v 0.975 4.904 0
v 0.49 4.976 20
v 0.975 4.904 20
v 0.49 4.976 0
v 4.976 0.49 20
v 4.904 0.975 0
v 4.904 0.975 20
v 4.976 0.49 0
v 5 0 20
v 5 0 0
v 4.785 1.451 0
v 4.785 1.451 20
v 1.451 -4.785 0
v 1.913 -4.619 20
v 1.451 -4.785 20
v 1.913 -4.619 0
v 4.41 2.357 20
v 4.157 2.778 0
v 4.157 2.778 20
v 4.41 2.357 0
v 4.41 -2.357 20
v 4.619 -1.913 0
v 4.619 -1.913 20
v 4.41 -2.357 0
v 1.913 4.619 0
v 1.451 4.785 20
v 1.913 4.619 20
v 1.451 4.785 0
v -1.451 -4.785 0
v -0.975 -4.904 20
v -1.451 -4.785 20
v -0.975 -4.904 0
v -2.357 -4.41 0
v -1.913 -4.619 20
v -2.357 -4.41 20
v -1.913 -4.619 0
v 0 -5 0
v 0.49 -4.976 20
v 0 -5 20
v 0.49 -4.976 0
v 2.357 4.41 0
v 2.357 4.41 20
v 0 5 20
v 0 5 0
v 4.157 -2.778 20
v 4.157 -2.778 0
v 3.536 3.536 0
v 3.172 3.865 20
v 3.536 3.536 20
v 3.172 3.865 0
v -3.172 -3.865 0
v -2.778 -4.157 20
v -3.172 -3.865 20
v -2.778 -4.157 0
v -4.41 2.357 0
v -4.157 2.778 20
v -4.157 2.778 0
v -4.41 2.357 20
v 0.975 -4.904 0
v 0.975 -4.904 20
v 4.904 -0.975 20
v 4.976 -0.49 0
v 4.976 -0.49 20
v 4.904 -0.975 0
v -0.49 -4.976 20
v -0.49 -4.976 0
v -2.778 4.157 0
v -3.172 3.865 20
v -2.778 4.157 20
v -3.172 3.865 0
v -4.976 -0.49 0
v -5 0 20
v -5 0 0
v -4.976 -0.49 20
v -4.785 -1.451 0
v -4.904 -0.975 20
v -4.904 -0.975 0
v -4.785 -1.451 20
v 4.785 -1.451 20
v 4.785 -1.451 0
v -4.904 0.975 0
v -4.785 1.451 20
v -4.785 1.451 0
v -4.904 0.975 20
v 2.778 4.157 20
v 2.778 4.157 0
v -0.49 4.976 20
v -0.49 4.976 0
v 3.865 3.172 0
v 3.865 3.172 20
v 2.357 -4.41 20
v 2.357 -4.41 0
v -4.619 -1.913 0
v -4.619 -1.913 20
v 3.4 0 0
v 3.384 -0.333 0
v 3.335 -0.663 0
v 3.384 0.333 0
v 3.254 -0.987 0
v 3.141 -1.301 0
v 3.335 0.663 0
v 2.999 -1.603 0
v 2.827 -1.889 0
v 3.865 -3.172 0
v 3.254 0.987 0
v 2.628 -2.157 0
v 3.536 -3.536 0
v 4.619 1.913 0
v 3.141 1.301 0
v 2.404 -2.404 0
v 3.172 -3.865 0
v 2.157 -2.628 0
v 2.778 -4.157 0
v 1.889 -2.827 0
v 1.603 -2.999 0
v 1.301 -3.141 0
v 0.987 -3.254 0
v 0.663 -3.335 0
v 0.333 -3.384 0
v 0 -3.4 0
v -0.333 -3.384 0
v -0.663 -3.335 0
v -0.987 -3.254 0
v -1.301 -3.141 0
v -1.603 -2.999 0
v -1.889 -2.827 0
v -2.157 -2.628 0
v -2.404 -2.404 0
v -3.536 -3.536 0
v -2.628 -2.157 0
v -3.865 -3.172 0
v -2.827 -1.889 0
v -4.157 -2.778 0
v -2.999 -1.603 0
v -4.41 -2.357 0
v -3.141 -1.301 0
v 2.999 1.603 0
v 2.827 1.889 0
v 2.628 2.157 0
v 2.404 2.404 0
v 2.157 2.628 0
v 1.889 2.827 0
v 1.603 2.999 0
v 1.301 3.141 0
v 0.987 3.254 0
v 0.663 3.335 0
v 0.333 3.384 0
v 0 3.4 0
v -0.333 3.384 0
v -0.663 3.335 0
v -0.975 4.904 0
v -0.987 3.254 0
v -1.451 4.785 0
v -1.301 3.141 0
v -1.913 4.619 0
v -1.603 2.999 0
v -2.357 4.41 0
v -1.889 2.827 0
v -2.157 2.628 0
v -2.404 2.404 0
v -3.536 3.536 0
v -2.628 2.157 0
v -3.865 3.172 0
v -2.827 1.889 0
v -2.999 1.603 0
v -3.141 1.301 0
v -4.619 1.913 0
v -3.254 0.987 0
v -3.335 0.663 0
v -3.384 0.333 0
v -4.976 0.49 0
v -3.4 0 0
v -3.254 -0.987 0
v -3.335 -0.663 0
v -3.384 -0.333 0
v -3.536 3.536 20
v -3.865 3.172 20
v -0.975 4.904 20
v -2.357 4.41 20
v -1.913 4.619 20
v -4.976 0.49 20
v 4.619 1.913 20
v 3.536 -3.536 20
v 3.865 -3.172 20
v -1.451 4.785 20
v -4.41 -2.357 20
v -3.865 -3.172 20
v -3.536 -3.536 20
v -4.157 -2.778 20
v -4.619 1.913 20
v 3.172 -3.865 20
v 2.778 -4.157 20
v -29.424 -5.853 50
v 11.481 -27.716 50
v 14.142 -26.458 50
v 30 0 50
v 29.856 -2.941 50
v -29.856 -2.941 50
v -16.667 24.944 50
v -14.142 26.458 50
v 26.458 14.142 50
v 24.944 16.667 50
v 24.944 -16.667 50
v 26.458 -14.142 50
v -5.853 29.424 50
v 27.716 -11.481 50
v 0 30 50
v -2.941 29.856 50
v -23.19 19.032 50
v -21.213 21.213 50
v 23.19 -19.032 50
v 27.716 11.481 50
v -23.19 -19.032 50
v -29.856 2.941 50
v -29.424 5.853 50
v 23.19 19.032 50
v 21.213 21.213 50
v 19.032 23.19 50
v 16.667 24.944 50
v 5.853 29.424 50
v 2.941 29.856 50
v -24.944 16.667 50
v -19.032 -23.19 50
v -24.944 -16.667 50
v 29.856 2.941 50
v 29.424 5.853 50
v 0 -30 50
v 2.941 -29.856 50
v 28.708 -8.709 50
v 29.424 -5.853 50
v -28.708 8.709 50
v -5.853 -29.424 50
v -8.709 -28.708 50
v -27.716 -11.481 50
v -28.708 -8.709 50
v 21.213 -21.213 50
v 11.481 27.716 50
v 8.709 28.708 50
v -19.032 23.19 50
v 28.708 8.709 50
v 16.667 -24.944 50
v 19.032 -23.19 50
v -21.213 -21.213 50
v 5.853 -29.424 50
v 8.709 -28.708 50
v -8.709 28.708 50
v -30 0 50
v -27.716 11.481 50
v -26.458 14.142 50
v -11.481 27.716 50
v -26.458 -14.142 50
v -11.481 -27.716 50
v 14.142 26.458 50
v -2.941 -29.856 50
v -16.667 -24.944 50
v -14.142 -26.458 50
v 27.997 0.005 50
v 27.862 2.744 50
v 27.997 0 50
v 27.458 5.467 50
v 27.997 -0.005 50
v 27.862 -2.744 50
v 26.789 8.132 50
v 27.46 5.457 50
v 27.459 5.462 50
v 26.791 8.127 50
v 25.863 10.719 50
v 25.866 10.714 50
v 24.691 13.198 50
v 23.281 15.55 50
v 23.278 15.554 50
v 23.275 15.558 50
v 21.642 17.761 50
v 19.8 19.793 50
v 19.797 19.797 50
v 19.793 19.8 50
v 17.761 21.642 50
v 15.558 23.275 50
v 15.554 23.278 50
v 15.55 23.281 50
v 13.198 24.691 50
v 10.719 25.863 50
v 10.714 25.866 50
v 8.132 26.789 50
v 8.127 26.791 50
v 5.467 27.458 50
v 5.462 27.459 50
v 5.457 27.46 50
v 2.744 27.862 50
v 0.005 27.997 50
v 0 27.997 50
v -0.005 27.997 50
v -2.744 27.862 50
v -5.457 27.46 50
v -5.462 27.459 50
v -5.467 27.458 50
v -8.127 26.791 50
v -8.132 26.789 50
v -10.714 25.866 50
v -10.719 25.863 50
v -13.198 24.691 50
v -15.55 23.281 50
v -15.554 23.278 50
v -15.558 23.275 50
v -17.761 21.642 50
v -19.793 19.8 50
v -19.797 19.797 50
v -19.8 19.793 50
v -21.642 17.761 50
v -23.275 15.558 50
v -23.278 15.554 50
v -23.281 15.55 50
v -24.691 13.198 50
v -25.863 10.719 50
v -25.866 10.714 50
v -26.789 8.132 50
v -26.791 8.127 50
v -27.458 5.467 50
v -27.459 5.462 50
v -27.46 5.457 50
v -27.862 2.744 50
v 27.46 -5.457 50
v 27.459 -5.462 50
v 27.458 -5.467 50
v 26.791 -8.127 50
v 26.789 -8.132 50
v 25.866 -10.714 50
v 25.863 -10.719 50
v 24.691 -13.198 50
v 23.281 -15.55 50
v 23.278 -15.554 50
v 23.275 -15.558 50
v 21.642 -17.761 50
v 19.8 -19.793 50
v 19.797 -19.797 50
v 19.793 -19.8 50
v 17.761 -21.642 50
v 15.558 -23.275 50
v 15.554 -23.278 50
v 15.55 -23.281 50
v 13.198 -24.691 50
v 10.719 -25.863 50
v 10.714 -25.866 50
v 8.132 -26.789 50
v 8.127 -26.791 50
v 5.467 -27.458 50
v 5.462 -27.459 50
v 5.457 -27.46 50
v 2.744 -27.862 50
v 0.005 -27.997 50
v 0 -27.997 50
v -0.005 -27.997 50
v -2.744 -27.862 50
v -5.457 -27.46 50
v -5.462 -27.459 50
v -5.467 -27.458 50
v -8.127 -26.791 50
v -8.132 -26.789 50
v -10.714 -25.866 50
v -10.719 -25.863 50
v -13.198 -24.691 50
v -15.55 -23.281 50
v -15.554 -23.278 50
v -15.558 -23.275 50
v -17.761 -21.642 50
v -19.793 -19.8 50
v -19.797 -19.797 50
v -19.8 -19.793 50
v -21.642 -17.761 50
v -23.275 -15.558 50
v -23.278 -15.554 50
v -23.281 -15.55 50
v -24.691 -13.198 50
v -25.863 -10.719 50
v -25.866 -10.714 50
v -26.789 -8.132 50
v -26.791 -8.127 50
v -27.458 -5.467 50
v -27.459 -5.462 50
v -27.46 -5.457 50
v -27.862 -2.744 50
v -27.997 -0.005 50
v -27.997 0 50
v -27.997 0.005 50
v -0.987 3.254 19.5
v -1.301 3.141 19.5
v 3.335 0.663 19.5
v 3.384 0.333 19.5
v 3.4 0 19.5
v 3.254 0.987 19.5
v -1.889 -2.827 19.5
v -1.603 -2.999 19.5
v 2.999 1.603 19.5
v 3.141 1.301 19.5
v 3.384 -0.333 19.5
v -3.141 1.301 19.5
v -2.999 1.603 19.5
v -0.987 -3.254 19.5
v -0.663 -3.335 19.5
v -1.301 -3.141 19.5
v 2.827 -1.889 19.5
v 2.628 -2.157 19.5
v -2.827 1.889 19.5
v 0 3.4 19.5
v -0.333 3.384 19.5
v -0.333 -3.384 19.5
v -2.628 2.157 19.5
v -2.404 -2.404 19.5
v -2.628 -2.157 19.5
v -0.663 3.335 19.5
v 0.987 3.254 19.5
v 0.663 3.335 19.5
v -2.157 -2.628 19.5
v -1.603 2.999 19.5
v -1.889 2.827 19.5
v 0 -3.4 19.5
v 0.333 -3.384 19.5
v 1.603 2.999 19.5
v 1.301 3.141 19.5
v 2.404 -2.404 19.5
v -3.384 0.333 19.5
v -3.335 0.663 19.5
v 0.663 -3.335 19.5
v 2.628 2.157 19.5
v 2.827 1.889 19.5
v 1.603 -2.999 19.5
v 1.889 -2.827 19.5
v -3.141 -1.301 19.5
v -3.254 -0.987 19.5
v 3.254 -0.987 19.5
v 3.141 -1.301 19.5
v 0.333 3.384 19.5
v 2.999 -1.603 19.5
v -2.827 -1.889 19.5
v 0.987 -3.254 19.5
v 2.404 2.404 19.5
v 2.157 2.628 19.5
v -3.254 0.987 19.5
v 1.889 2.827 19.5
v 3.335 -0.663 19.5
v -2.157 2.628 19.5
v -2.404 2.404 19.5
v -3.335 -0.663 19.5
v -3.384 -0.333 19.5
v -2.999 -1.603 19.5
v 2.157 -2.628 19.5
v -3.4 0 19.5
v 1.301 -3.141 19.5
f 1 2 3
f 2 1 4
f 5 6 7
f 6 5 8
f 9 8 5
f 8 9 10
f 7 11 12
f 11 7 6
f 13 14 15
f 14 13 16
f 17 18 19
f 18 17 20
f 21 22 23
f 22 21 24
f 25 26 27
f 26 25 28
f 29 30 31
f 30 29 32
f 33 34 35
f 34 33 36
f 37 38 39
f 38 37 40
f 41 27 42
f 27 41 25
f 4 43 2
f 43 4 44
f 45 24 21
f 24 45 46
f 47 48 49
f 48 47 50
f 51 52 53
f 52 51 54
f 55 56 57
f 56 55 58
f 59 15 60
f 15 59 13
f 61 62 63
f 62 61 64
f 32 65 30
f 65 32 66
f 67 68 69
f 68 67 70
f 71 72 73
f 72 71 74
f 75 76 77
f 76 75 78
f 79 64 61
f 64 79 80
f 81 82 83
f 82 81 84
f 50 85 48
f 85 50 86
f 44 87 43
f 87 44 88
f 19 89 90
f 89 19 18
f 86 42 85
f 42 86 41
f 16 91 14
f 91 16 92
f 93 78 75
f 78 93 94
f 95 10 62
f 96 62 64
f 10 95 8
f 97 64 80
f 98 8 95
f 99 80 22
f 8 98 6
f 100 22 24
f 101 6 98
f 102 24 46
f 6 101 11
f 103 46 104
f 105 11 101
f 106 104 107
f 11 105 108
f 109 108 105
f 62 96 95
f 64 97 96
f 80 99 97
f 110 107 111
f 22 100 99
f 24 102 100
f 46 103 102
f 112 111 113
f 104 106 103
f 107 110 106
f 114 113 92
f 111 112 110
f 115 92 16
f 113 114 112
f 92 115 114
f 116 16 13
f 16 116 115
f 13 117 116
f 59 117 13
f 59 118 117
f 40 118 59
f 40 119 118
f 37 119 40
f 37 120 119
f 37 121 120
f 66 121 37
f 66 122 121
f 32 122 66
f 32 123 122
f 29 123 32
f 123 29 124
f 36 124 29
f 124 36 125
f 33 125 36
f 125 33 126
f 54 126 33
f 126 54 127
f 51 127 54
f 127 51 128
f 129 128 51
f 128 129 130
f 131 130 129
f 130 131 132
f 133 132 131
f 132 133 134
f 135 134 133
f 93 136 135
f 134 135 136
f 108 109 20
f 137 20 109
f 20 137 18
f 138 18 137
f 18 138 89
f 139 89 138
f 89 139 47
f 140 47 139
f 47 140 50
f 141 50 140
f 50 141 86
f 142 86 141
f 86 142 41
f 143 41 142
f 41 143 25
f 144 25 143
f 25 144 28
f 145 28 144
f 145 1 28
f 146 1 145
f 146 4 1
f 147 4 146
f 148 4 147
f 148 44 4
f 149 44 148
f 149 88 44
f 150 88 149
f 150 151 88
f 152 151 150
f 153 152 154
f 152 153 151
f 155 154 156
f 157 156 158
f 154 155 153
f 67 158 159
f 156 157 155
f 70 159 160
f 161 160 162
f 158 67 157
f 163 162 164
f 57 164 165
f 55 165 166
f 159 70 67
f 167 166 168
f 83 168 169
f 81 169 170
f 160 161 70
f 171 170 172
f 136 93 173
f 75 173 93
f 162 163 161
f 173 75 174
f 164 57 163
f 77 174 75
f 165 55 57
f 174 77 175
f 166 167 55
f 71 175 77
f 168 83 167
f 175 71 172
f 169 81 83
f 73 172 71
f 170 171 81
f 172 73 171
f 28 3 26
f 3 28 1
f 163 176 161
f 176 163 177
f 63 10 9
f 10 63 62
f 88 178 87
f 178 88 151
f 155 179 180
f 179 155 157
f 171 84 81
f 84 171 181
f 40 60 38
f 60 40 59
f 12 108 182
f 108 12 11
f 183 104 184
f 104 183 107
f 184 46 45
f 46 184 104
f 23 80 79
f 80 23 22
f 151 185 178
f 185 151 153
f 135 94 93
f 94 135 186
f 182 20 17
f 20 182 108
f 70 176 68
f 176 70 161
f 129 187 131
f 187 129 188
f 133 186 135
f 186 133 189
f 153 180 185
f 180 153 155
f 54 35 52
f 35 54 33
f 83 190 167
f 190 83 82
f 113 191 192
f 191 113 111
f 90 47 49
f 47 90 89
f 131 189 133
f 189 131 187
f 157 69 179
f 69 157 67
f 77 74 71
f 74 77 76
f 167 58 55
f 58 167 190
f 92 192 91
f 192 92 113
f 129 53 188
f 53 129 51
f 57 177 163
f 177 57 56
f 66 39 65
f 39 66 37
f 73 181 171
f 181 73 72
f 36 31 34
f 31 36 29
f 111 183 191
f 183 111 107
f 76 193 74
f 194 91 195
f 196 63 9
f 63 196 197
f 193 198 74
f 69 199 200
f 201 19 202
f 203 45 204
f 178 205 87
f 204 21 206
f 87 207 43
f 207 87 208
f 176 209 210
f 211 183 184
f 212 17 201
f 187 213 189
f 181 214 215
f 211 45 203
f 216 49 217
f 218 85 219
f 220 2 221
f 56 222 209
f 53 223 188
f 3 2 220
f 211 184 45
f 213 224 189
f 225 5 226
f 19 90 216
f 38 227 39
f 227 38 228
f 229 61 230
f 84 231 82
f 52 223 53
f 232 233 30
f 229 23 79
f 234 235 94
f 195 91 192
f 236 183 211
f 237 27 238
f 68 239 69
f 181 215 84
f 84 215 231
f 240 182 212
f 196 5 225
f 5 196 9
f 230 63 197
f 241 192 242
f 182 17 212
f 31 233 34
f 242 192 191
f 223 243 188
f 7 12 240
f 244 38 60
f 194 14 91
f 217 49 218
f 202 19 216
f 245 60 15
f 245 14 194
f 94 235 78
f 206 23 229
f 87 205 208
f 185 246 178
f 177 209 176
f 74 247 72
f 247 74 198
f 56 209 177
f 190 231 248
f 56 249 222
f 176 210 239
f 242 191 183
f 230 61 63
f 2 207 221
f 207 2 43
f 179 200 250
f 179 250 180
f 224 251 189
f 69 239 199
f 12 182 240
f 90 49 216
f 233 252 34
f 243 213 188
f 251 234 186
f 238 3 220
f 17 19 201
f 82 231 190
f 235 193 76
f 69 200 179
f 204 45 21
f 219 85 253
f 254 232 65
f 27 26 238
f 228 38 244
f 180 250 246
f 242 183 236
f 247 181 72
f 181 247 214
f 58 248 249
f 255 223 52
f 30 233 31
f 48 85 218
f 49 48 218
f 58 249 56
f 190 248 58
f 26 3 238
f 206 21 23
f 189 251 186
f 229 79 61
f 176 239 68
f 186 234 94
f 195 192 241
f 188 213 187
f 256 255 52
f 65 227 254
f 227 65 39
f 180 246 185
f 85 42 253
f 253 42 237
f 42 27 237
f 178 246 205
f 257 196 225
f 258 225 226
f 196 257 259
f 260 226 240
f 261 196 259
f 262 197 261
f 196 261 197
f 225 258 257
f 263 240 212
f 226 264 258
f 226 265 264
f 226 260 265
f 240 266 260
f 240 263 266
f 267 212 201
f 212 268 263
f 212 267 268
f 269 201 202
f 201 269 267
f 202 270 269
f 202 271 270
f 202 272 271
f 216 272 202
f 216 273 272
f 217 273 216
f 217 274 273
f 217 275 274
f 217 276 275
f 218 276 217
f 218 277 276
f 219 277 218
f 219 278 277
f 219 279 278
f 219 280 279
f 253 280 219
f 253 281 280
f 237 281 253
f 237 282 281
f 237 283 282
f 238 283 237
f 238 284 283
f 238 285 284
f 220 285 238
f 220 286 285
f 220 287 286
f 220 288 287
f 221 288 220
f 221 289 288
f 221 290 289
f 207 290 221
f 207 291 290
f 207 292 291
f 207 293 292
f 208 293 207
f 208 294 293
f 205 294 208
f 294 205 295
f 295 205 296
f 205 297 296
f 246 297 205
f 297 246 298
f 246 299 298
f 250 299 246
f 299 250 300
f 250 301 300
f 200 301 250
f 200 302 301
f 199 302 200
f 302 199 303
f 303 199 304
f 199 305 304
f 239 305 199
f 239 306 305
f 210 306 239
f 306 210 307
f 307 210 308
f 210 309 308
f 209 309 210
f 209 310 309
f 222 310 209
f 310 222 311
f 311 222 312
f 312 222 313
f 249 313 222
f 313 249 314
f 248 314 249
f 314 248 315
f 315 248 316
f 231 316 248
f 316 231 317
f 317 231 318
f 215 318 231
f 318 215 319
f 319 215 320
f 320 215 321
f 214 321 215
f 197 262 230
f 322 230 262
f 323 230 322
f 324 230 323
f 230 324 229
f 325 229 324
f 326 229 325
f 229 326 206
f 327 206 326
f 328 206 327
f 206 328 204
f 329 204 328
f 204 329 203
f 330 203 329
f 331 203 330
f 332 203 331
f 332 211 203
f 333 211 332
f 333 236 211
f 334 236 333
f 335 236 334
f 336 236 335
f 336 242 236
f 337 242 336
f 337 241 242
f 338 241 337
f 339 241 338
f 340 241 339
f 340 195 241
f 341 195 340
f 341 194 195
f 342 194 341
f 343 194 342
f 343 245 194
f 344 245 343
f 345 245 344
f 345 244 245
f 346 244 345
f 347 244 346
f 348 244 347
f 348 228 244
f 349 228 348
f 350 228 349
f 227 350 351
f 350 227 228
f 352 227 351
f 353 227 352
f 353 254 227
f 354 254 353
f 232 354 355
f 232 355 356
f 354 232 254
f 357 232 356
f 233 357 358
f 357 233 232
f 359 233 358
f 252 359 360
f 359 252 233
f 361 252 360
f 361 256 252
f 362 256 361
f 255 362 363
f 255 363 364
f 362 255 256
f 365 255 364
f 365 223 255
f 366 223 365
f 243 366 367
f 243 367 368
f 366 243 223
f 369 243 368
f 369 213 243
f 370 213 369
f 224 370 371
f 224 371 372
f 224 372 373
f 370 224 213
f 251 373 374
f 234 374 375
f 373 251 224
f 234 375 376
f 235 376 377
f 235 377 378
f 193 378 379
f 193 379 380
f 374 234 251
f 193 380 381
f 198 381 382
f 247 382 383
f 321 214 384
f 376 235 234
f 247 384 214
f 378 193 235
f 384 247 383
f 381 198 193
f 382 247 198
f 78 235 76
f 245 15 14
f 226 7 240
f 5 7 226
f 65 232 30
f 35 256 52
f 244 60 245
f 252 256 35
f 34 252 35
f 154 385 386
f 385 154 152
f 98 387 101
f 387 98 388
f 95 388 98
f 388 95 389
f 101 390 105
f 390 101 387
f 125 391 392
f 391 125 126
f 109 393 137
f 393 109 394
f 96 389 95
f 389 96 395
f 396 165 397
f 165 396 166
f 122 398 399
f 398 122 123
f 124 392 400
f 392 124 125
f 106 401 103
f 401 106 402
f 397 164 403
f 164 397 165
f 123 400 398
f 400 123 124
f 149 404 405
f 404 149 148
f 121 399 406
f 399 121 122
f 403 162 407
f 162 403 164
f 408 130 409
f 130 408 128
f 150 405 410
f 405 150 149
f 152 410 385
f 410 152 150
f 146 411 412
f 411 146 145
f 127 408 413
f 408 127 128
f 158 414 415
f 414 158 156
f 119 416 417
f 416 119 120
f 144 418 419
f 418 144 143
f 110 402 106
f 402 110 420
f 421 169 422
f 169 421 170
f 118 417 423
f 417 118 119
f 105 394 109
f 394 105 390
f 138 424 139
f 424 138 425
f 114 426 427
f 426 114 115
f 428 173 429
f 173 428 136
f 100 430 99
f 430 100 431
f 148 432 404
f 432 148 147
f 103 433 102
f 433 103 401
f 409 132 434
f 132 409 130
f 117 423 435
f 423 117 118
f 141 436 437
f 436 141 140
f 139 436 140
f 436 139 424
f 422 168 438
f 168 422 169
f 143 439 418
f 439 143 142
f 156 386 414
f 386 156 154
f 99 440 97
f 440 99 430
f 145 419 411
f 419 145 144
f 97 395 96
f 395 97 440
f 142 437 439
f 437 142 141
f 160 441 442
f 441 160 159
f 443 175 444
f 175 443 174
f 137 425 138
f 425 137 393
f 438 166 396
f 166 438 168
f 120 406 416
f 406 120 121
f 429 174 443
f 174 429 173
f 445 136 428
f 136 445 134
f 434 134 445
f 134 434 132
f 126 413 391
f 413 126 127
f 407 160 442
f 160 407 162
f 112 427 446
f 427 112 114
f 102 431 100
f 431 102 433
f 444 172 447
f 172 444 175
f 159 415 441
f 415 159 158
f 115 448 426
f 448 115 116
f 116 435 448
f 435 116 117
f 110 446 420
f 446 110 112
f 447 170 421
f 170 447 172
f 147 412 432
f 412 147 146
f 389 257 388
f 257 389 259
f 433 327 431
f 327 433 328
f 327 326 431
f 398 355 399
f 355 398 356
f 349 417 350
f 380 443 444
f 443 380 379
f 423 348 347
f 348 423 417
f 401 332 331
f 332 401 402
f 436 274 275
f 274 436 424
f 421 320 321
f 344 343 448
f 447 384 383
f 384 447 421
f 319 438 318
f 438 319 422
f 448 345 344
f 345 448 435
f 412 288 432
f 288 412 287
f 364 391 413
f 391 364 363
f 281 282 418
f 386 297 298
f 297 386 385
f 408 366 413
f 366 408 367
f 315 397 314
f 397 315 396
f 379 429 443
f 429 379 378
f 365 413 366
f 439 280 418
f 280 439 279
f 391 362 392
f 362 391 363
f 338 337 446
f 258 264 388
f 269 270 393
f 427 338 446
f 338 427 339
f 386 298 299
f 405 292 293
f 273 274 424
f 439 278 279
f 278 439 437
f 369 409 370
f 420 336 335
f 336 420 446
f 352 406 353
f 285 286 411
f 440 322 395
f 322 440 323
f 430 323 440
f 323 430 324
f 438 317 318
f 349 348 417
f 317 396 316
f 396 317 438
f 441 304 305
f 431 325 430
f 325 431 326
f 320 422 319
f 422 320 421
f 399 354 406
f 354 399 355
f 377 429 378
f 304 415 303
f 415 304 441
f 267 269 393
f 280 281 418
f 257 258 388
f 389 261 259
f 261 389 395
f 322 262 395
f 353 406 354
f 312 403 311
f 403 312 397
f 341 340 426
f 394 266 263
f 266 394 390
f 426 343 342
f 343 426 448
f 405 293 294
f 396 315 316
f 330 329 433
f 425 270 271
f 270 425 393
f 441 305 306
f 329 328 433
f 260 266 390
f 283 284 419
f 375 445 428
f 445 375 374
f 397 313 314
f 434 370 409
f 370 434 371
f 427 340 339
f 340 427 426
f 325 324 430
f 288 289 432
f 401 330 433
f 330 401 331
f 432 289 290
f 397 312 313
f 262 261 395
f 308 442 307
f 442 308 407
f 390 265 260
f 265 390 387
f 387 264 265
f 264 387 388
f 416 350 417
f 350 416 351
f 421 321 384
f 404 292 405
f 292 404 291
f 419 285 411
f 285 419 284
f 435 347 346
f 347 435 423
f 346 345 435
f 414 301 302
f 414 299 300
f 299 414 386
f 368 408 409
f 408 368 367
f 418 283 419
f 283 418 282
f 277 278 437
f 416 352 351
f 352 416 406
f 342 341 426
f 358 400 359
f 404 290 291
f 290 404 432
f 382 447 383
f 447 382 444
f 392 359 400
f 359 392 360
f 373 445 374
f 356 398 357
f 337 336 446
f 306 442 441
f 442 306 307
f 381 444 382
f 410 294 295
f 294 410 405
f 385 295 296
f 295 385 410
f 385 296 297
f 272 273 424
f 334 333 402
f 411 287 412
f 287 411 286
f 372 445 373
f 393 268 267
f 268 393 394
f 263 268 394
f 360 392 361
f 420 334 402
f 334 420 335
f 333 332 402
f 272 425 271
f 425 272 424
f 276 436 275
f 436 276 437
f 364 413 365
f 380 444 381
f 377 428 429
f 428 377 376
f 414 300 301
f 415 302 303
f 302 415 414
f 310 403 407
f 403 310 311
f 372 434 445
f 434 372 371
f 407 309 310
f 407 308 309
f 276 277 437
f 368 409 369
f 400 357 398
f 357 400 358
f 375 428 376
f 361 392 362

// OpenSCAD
// Funnel parameters (all in mm)
outer_d_spout = 10;          // outer diameter of straight spout
wall_thickness = 1.6;        // wall thickness throughout
inner_d_spout = outer_d_spout - 2*wall_thickness; // bore diameter of spout (6.8)

outer_d_top = 60;            // outer diameter at funnel rim (z = 50)
inner_d_top = outer_d_top - 2*wall_thickness; // bore diameter at rim (56.8)

height_spout = 20;           // spout length from z=0 to z=20
height_cone = 30;            // cone length from z=20 to z=50

cut = 0.5;                   // extra length for cutting shapes (0.01‑1 mm)

$fn = 64;                    // resolution for circles and cones

// ---------- Outer solid (spout + cone) ----------
module outer_funnel() {
    union() {
        // Outer cylindrical spout
        cylinder(h = height_spout, d = outer_d_spout);
        // Outer conical section
        translate([0,0,height_spout])
            cylinder(h = height_cone, d1 = outer_d_spout, d2 = outer_d_top);
    }
}

// ---------- Inner void (bore) ----------
module inner_void() {
    union() {
        // Inner cylindrical bore, extended past the outer faces
        translate([0,0,-cut])
            cylinder(h = height_spout + 2*cut, d = inner_d_spout);
        // Inner conical bore, extended past the outer faces
        translate([0,0,height_spout - cut])
            cylinder(h = height_cone + 2*cut,
                     d1 = inner_d_spout,
                     d2 = inner_d_top);
    }
}

// ---------- Final part ----------
difference() {
    outer_funnel();
    inner_void();
}
